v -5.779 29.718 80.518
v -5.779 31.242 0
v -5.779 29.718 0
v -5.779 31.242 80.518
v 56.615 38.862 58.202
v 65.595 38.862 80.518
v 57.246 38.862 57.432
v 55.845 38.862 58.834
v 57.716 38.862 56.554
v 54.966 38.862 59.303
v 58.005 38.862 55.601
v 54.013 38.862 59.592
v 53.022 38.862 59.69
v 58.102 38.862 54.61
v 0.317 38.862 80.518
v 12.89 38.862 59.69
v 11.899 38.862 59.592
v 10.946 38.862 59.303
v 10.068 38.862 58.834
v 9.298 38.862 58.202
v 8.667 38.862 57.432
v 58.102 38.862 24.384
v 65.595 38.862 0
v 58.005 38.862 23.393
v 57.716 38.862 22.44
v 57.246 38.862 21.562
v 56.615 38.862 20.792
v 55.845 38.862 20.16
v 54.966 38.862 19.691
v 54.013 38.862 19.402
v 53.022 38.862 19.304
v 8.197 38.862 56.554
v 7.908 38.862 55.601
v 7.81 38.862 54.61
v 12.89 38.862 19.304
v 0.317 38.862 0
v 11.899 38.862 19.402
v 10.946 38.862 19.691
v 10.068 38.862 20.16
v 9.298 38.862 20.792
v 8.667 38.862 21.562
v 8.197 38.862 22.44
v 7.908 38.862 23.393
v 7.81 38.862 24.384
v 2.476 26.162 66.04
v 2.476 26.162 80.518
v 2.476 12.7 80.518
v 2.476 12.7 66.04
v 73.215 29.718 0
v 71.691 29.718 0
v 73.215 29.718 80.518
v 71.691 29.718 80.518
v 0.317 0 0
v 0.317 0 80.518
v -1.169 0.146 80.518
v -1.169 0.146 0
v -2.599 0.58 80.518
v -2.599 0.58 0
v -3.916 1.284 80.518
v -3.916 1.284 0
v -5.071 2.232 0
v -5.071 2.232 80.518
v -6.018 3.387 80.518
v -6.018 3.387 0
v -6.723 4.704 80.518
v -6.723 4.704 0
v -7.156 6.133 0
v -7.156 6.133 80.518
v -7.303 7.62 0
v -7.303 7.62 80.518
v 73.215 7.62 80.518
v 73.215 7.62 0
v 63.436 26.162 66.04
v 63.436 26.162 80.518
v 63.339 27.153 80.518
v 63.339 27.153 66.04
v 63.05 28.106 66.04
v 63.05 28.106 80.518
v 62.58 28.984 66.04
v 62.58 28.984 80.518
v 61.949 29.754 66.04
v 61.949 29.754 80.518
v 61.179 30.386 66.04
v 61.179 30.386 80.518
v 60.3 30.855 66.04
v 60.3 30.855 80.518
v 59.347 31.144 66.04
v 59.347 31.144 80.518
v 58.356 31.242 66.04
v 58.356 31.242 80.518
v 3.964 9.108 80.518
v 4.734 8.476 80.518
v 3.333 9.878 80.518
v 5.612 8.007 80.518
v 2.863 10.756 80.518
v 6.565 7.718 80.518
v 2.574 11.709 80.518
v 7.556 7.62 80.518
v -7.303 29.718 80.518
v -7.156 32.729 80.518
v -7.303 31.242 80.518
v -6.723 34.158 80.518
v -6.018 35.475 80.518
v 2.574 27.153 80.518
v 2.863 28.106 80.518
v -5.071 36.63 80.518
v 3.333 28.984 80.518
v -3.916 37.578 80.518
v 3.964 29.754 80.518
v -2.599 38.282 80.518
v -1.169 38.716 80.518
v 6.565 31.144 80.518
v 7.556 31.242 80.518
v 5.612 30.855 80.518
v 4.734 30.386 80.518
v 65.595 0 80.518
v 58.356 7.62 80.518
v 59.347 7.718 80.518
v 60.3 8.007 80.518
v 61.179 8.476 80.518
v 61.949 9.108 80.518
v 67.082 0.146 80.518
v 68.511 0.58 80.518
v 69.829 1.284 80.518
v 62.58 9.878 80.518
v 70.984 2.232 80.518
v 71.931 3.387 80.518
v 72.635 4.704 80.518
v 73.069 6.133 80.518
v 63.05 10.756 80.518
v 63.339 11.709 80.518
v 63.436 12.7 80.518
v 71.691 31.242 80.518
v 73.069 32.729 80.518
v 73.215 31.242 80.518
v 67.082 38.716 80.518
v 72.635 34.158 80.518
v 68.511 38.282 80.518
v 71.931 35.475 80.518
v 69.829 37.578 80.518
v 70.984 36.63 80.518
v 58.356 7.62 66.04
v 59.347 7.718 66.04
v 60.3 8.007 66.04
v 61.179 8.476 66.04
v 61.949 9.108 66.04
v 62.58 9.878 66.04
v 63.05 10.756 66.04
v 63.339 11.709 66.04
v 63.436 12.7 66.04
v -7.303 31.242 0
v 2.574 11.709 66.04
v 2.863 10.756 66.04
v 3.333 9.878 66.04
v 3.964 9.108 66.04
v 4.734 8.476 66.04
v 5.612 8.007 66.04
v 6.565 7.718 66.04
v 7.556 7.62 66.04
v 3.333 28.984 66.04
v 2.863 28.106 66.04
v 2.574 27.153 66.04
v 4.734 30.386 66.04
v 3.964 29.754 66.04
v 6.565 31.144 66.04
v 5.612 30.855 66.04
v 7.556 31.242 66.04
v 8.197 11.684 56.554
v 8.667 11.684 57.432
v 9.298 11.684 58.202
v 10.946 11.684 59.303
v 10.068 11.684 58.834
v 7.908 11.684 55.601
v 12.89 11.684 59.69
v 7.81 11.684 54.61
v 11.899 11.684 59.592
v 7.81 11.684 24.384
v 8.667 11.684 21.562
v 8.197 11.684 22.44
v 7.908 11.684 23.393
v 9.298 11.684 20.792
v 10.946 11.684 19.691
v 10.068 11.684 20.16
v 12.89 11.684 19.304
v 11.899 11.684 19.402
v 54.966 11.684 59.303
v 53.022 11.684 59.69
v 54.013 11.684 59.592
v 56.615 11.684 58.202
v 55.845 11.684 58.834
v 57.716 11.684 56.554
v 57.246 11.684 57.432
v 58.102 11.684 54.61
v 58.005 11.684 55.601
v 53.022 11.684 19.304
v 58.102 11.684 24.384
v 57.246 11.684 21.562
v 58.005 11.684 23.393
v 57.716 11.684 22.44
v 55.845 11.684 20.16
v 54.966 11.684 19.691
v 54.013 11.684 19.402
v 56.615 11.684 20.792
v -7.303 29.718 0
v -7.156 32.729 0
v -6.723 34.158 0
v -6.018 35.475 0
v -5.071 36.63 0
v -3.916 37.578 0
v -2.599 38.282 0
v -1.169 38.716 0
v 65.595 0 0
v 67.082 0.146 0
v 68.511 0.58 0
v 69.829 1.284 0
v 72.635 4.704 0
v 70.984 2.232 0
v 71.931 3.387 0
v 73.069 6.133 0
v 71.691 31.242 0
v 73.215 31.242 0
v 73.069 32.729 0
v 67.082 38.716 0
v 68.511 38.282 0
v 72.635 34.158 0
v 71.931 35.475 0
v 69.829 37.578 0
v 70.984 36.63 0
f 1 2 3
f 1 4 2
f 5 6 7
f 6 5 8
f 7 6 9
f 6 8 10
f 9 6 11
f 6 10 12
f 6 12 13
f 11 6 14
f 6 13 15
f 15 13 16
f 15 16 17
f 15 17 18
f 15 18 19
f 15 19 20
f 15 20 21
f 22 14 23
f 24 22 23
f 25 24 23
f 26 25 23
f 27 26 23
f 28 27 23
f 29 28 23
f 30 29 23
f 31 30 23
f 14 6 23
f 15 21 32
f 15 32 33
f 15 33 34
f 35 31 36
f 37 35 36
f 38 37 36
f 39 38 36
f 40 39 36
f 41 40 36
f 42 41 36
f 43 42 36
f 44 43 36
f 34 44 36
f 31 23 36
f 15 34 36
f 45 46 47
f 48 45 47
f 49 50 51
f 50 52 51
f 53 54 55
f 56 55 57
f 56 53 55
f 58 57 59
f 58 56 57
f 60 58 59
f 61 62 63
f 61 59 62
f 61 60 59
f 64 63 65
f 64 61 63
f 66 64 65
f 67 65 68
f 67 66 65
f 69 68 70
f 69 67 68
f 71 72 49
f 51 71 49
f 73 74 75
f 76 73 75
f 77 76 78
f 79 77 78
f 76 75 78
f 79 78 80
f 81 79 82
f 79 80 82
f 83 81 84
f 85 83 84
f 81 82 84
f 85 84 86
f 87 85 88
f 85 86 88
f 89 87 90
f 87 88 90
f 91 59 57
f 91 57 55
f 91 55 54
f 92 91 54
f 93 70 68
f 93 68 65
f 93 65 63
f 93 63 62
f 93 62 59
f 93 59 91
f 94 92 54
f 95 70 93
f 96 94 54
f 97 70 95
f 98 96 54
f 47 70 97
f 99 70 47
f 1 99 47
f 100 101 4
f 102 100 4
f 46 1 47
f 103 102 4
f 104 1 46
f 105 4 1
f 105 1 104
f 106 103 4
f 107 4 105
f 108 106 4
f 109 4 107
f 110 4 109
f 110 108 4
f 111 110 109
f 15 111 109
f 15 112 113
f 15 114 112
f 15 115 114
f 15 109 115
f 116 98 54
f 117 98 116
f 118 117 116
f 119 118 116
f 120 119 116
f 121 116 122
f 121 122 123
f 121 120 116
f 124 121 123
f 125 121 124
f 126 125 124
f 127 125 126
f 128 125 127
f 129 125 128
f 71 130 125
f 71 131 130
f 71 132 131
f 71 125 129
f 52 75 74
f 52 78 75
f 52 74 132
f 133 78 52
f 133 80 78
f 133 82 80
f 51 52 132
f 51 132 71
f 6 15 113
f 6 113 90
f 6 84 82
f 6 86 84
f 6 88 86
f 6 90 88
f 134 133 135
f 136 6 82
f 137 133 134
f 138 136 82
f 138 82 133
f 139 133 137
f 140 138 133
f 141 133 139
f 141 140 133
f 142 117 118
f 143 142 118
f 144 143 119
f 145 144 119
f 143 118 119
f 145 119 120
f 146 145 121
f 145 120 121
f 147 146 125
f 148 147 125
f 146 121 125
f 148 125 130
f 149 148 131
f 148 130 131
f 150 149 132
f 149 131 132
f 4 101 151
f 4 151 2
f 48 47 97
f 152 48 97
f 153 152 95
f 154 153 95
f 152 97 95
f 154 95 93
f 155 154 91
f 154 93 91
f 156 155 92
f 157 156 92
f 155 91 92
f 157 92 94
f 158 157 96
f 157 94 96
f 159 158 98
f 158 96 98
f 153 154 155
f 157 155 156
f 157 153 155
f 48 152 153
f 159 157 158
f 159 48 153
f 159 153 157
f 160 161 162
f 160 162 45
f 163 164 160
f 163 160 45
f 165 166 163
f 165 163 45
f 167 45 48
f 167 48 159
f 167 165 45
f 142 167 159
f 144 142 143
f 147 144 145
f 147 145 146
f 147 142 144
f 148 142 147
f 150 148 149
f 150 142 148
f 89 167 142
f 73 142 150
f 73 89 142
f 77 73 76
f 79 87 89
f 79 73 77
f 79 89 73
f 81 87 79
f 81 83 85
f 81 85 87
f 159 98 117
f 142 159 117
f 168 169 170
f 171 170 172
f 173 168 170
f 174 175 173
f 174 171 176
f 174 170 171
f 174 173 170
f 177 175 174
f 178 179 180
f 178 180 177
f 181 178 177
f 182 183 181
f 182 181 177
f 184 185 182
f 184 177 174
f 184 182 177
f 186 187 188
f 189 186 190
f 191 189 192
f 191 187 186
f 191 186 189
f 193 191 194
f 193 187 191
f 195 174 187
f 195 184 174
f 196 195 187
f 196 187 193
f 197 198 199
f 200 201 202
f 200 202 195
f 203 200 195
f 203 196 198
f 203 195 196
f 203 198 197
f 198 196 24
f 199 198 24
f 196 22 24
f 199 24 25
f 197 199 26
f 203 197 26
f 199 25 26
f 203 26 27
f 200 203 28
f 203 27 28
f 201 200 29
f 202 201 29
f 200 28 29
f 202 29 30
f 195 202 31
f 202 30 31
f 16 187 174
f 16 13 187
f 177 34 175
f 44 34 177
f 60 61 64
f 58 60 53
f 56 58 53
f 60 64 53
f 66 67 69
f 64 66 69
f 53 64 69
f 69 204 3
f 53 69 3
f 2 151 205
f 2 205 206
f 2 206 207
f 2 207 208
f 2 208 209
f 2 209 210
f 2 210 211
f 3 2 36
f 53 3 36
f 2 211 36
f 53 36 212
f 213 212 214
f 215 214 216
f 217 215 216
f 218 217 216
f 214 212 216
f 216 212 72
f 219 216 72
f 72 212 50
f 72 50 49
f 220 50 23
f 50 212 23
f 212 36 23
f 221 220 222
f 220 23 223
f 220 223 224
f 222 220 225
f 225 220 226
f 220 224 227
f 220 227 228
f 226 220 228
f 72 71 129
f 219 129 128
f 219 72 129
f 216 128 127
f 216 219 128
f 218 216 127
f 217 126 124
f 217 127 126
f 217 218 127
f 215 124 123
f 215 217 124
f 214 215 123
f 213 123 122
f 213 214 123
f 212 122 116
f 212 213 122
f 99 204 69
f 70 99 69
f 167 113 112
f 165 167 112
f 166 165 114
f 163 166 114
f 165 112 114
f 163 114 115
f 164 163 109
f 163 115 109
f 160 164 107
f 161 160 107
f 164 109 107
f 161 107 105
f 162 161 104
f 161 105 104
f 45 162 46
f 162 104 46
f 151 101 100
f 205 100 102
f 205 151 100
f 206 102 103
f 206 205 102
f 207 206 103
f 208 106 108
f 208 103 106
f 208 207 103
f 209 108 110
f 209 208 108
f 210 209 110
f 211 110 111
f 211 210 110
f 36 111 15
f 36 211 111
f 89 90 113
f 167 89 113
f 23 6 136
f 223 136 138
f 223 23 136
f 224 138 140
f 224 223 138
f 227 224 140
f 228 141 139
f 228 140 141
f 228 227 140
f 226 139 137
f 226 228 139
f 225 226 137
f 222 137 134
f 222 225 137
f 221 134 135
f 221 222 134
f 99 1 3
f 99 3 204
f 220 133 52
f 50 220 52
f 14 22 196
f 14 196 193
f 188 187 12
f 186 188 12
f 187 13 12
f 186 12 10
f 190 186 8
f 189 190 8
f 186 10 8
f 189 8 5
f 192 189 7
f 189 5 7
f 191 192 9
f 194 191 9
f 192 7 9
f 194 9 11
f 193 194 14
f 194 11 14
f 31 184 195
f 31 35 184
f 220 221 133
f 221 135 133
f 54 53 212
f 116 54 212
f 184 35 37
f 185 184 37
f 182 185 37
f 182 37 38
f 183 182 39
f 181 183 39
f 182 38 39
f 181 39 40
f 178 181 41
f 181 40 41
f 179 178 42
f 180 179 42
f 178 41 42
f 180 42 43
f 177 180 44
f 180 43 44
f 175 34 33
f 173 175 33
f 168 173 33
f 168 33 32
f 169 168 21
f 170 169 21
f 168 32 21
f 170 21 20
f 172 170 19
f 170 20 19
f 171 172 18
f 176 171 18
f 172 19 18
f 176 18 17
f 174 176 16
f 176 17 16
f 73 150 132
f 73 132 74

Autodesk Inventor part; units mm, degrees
ref_plane "YZ Plane" through (0, 0, 0) normal (1, 0, 0) x (0, 1, 0)
ref_plane "XZ Plane" through (0, 0, 0) normal (0, 1, 0) x (-1, 0, 0)
ref_plane "XY Plane" through (0, 0, 0) normal (0, 0, 1) x (1, 0, 0)
sketch "Sketch1" plane through (0, 0, 0) normal (0, 0, 1) x (1, 0, 0)
  point P0 (0, 0)
sketch "Sketch2" plane through (0, 0, 0) normal (0, 0, 1) x (1, 0, 0)
  line L0 (0.3174, 0) -> (65.5954, 0)
  line L1 (73.2154, 7.62) -> (73.2154, 31.242)
  line L2 (65.5954, 38.862) -> (0.3174, 38.862)
  line L3 (-7.3026, 31.242) -> (-7.3026, 7.62)
  arc A0 (0.3174, 38.862) -> (-7.3026, 31.242) centre (0.3174, 31.242) ccw
  arc A1 (-7.3026, 7.62) -> (0.3174, 0) centre (0.3174, 7.62) ccw
  arc A2 (73.2154, 31.242) -> (65.5954, 38.862) centre (65.5954, 31.242) ccw
  arc A3 (65.5954, 0) -> (73.2154, 7.62) centre (65.5954, 7.62) ccw
  point P0 (0, 0)
  point P1 (-7.3026, 0)
  point P2 (73.2154, 0)
  point P3 (73.2154, 38.862)
  dimension "d0" = 80.518
  dimension "d1" = 38.862
  dimension "d2" = 7.62
extrude "Extrusion1" add sketch "Sketch2" along normal blind 80.518
sketch "Sketch3" plane through (0, 0, 80.518) normal (0, 0, 1) x (1, 0, 0)
  line L0 (7.5564, 7.62) -> (58.3564, 7.62)
  line L1 (63.4364, 12.7) -> (63.4364, 26.162)
  line L2 (58.3564, 31.242) -> (7.5564, 31.242)
  line L3 (2.4764, 26.162) -> (2.4764, 12.7)
  line L4 (73.2154, 7.62) -> (73.2154, 31.242) projected
  line L5 (65.5954, 38.862) -> (0.3174, 38.862) projected
  arc A0 (7.5564, 31.242) -> (2.4764, 26.162) centre (7.5564, 26.162) ccw
  arc A1 (2.4764, 12.7) -> (7.5564, 7.62) centre (7.5564, 12.7) ccw
  arc A2 (58.3564, 7.62) -> (63.4364, 12.7) centre (58.3564, 12.7) ccw
  arc A3 (63.4364, 26.162) -> (58.3564, 31.242) centre (58.3564, 26.162) ccw
  point P0 (0, 0)
  point P1 (2.4764, 7.62)
  point P2 (63.4364, 7.62)
  point P3 (63.4364, 31.242)
  dimension "d5" = 60.96
  dimension "d6" = 23.622
  dimension "d7" = 9.779
  dimension "d8" = 7.62
  dimension "d9" = 5.08
extrude "Extrusion2" cut sketch "Sketch3" against normal blind 14.478
sketch "Sketch4" plane through (0.3174, 38.862, 0) normal (0, 1, 0) x (1, 0, 0)
  line L0 (12.573, -19.304) -> (52.705, -19.304)
  line L1 (57.785, -24.384) -> (57.785, -54.61)
  line L2 (52.705, -59.69) -> (12.573, -59.69)
  line L3 (7.493, -54.61) -> (7.493, -24.384)
  line L4 (65.278, -80.518) -> (0, -80.518) projected
  line L5 (72.898, 0) -> (72.898, -80.518) projected
  arc A0 (7.493, -54.61) -> (12.573, -59.69) centre (12.573, -54.61) ccw
  arc A1 (12.573, -19.304) -> (7.493, -24.384) centre (12.573, -24.384) ccw
  arc A2 (57.785, -24.384) -> (52.705, -19.304) centre (52.705, -24.384) ccw
  arc A3 (52.705, -59.69) -> (57.785, -54.61) centre (52.705, -54.61) ccw
  point P0 (-0.3174, 0)
  point P1 (7.493, -19.304)
  point P2 (57.785, -19.304)
  point P3 (57.785, -59.69)
  point P4 (7.493, -59.69)
  dimension "d12" = 50.292
  dimension "d13" = 40.386
  dimension "d14" = 20.828
  dimension "d15" = 15.113
  dimension "d18" = 5.08
extrude "Extrusion3" cut sketch "Sketch4" against normal blind 27.178
sketch "Sketch5" plane through (0, 0, 80.518) normal (0, 0, 1) x (1, 0, 0)
  line L0 (73.2154, 7.62) -> (73.2154, 31.242) projected
  line L1 (73.2154, 31.242) -> (71.6914, 31.242)
  line L2 (71.6914, 31.242) -> (71.6914, 29.718)
  line L3 (71.6914, 29.718) -> (73.2154, 29.718)
  line L4 (73.2154, 31.242) -> (73.2154, 29.718)
  line L5 (65.5954, 38.862) -> (0.3174, 38.862) projected
  point P0 (0, 0)
  dimension "d19" = 1.524
  dimension "d20" = 1.524
  dimension "d21" = 7.62
extrude "Extrusion4" cut sketch "Sketch5" against normal blind 80.518
sketch "Sketch6" plane through (0, 0, 80.518) normal (0, 0, 1) x (1, 0, 0)
  line L0 (-7.3026, 31.242) -> (-7.3026, 7.62) projected
  line L1 (-7.3026, 31.242) -> (-5.7786, 31.242)
  line L2 (-5.7786, 31.242) -> (-5.7786, 29.718)
  line L3 (-5.7786, 29.718) -> (-7.3026, 29.718)
  line L4 (-7.3026, 31.242) -> (-7.3026, 29.718)
  point P0 (0, 0)
  dimension "d24" = 1.524
  dimension "d25" = 1.524
extrude "Extrusion5" cut sketch "Sketch6" against normal blind 80.518
properties material "Wood (Cherry)"
